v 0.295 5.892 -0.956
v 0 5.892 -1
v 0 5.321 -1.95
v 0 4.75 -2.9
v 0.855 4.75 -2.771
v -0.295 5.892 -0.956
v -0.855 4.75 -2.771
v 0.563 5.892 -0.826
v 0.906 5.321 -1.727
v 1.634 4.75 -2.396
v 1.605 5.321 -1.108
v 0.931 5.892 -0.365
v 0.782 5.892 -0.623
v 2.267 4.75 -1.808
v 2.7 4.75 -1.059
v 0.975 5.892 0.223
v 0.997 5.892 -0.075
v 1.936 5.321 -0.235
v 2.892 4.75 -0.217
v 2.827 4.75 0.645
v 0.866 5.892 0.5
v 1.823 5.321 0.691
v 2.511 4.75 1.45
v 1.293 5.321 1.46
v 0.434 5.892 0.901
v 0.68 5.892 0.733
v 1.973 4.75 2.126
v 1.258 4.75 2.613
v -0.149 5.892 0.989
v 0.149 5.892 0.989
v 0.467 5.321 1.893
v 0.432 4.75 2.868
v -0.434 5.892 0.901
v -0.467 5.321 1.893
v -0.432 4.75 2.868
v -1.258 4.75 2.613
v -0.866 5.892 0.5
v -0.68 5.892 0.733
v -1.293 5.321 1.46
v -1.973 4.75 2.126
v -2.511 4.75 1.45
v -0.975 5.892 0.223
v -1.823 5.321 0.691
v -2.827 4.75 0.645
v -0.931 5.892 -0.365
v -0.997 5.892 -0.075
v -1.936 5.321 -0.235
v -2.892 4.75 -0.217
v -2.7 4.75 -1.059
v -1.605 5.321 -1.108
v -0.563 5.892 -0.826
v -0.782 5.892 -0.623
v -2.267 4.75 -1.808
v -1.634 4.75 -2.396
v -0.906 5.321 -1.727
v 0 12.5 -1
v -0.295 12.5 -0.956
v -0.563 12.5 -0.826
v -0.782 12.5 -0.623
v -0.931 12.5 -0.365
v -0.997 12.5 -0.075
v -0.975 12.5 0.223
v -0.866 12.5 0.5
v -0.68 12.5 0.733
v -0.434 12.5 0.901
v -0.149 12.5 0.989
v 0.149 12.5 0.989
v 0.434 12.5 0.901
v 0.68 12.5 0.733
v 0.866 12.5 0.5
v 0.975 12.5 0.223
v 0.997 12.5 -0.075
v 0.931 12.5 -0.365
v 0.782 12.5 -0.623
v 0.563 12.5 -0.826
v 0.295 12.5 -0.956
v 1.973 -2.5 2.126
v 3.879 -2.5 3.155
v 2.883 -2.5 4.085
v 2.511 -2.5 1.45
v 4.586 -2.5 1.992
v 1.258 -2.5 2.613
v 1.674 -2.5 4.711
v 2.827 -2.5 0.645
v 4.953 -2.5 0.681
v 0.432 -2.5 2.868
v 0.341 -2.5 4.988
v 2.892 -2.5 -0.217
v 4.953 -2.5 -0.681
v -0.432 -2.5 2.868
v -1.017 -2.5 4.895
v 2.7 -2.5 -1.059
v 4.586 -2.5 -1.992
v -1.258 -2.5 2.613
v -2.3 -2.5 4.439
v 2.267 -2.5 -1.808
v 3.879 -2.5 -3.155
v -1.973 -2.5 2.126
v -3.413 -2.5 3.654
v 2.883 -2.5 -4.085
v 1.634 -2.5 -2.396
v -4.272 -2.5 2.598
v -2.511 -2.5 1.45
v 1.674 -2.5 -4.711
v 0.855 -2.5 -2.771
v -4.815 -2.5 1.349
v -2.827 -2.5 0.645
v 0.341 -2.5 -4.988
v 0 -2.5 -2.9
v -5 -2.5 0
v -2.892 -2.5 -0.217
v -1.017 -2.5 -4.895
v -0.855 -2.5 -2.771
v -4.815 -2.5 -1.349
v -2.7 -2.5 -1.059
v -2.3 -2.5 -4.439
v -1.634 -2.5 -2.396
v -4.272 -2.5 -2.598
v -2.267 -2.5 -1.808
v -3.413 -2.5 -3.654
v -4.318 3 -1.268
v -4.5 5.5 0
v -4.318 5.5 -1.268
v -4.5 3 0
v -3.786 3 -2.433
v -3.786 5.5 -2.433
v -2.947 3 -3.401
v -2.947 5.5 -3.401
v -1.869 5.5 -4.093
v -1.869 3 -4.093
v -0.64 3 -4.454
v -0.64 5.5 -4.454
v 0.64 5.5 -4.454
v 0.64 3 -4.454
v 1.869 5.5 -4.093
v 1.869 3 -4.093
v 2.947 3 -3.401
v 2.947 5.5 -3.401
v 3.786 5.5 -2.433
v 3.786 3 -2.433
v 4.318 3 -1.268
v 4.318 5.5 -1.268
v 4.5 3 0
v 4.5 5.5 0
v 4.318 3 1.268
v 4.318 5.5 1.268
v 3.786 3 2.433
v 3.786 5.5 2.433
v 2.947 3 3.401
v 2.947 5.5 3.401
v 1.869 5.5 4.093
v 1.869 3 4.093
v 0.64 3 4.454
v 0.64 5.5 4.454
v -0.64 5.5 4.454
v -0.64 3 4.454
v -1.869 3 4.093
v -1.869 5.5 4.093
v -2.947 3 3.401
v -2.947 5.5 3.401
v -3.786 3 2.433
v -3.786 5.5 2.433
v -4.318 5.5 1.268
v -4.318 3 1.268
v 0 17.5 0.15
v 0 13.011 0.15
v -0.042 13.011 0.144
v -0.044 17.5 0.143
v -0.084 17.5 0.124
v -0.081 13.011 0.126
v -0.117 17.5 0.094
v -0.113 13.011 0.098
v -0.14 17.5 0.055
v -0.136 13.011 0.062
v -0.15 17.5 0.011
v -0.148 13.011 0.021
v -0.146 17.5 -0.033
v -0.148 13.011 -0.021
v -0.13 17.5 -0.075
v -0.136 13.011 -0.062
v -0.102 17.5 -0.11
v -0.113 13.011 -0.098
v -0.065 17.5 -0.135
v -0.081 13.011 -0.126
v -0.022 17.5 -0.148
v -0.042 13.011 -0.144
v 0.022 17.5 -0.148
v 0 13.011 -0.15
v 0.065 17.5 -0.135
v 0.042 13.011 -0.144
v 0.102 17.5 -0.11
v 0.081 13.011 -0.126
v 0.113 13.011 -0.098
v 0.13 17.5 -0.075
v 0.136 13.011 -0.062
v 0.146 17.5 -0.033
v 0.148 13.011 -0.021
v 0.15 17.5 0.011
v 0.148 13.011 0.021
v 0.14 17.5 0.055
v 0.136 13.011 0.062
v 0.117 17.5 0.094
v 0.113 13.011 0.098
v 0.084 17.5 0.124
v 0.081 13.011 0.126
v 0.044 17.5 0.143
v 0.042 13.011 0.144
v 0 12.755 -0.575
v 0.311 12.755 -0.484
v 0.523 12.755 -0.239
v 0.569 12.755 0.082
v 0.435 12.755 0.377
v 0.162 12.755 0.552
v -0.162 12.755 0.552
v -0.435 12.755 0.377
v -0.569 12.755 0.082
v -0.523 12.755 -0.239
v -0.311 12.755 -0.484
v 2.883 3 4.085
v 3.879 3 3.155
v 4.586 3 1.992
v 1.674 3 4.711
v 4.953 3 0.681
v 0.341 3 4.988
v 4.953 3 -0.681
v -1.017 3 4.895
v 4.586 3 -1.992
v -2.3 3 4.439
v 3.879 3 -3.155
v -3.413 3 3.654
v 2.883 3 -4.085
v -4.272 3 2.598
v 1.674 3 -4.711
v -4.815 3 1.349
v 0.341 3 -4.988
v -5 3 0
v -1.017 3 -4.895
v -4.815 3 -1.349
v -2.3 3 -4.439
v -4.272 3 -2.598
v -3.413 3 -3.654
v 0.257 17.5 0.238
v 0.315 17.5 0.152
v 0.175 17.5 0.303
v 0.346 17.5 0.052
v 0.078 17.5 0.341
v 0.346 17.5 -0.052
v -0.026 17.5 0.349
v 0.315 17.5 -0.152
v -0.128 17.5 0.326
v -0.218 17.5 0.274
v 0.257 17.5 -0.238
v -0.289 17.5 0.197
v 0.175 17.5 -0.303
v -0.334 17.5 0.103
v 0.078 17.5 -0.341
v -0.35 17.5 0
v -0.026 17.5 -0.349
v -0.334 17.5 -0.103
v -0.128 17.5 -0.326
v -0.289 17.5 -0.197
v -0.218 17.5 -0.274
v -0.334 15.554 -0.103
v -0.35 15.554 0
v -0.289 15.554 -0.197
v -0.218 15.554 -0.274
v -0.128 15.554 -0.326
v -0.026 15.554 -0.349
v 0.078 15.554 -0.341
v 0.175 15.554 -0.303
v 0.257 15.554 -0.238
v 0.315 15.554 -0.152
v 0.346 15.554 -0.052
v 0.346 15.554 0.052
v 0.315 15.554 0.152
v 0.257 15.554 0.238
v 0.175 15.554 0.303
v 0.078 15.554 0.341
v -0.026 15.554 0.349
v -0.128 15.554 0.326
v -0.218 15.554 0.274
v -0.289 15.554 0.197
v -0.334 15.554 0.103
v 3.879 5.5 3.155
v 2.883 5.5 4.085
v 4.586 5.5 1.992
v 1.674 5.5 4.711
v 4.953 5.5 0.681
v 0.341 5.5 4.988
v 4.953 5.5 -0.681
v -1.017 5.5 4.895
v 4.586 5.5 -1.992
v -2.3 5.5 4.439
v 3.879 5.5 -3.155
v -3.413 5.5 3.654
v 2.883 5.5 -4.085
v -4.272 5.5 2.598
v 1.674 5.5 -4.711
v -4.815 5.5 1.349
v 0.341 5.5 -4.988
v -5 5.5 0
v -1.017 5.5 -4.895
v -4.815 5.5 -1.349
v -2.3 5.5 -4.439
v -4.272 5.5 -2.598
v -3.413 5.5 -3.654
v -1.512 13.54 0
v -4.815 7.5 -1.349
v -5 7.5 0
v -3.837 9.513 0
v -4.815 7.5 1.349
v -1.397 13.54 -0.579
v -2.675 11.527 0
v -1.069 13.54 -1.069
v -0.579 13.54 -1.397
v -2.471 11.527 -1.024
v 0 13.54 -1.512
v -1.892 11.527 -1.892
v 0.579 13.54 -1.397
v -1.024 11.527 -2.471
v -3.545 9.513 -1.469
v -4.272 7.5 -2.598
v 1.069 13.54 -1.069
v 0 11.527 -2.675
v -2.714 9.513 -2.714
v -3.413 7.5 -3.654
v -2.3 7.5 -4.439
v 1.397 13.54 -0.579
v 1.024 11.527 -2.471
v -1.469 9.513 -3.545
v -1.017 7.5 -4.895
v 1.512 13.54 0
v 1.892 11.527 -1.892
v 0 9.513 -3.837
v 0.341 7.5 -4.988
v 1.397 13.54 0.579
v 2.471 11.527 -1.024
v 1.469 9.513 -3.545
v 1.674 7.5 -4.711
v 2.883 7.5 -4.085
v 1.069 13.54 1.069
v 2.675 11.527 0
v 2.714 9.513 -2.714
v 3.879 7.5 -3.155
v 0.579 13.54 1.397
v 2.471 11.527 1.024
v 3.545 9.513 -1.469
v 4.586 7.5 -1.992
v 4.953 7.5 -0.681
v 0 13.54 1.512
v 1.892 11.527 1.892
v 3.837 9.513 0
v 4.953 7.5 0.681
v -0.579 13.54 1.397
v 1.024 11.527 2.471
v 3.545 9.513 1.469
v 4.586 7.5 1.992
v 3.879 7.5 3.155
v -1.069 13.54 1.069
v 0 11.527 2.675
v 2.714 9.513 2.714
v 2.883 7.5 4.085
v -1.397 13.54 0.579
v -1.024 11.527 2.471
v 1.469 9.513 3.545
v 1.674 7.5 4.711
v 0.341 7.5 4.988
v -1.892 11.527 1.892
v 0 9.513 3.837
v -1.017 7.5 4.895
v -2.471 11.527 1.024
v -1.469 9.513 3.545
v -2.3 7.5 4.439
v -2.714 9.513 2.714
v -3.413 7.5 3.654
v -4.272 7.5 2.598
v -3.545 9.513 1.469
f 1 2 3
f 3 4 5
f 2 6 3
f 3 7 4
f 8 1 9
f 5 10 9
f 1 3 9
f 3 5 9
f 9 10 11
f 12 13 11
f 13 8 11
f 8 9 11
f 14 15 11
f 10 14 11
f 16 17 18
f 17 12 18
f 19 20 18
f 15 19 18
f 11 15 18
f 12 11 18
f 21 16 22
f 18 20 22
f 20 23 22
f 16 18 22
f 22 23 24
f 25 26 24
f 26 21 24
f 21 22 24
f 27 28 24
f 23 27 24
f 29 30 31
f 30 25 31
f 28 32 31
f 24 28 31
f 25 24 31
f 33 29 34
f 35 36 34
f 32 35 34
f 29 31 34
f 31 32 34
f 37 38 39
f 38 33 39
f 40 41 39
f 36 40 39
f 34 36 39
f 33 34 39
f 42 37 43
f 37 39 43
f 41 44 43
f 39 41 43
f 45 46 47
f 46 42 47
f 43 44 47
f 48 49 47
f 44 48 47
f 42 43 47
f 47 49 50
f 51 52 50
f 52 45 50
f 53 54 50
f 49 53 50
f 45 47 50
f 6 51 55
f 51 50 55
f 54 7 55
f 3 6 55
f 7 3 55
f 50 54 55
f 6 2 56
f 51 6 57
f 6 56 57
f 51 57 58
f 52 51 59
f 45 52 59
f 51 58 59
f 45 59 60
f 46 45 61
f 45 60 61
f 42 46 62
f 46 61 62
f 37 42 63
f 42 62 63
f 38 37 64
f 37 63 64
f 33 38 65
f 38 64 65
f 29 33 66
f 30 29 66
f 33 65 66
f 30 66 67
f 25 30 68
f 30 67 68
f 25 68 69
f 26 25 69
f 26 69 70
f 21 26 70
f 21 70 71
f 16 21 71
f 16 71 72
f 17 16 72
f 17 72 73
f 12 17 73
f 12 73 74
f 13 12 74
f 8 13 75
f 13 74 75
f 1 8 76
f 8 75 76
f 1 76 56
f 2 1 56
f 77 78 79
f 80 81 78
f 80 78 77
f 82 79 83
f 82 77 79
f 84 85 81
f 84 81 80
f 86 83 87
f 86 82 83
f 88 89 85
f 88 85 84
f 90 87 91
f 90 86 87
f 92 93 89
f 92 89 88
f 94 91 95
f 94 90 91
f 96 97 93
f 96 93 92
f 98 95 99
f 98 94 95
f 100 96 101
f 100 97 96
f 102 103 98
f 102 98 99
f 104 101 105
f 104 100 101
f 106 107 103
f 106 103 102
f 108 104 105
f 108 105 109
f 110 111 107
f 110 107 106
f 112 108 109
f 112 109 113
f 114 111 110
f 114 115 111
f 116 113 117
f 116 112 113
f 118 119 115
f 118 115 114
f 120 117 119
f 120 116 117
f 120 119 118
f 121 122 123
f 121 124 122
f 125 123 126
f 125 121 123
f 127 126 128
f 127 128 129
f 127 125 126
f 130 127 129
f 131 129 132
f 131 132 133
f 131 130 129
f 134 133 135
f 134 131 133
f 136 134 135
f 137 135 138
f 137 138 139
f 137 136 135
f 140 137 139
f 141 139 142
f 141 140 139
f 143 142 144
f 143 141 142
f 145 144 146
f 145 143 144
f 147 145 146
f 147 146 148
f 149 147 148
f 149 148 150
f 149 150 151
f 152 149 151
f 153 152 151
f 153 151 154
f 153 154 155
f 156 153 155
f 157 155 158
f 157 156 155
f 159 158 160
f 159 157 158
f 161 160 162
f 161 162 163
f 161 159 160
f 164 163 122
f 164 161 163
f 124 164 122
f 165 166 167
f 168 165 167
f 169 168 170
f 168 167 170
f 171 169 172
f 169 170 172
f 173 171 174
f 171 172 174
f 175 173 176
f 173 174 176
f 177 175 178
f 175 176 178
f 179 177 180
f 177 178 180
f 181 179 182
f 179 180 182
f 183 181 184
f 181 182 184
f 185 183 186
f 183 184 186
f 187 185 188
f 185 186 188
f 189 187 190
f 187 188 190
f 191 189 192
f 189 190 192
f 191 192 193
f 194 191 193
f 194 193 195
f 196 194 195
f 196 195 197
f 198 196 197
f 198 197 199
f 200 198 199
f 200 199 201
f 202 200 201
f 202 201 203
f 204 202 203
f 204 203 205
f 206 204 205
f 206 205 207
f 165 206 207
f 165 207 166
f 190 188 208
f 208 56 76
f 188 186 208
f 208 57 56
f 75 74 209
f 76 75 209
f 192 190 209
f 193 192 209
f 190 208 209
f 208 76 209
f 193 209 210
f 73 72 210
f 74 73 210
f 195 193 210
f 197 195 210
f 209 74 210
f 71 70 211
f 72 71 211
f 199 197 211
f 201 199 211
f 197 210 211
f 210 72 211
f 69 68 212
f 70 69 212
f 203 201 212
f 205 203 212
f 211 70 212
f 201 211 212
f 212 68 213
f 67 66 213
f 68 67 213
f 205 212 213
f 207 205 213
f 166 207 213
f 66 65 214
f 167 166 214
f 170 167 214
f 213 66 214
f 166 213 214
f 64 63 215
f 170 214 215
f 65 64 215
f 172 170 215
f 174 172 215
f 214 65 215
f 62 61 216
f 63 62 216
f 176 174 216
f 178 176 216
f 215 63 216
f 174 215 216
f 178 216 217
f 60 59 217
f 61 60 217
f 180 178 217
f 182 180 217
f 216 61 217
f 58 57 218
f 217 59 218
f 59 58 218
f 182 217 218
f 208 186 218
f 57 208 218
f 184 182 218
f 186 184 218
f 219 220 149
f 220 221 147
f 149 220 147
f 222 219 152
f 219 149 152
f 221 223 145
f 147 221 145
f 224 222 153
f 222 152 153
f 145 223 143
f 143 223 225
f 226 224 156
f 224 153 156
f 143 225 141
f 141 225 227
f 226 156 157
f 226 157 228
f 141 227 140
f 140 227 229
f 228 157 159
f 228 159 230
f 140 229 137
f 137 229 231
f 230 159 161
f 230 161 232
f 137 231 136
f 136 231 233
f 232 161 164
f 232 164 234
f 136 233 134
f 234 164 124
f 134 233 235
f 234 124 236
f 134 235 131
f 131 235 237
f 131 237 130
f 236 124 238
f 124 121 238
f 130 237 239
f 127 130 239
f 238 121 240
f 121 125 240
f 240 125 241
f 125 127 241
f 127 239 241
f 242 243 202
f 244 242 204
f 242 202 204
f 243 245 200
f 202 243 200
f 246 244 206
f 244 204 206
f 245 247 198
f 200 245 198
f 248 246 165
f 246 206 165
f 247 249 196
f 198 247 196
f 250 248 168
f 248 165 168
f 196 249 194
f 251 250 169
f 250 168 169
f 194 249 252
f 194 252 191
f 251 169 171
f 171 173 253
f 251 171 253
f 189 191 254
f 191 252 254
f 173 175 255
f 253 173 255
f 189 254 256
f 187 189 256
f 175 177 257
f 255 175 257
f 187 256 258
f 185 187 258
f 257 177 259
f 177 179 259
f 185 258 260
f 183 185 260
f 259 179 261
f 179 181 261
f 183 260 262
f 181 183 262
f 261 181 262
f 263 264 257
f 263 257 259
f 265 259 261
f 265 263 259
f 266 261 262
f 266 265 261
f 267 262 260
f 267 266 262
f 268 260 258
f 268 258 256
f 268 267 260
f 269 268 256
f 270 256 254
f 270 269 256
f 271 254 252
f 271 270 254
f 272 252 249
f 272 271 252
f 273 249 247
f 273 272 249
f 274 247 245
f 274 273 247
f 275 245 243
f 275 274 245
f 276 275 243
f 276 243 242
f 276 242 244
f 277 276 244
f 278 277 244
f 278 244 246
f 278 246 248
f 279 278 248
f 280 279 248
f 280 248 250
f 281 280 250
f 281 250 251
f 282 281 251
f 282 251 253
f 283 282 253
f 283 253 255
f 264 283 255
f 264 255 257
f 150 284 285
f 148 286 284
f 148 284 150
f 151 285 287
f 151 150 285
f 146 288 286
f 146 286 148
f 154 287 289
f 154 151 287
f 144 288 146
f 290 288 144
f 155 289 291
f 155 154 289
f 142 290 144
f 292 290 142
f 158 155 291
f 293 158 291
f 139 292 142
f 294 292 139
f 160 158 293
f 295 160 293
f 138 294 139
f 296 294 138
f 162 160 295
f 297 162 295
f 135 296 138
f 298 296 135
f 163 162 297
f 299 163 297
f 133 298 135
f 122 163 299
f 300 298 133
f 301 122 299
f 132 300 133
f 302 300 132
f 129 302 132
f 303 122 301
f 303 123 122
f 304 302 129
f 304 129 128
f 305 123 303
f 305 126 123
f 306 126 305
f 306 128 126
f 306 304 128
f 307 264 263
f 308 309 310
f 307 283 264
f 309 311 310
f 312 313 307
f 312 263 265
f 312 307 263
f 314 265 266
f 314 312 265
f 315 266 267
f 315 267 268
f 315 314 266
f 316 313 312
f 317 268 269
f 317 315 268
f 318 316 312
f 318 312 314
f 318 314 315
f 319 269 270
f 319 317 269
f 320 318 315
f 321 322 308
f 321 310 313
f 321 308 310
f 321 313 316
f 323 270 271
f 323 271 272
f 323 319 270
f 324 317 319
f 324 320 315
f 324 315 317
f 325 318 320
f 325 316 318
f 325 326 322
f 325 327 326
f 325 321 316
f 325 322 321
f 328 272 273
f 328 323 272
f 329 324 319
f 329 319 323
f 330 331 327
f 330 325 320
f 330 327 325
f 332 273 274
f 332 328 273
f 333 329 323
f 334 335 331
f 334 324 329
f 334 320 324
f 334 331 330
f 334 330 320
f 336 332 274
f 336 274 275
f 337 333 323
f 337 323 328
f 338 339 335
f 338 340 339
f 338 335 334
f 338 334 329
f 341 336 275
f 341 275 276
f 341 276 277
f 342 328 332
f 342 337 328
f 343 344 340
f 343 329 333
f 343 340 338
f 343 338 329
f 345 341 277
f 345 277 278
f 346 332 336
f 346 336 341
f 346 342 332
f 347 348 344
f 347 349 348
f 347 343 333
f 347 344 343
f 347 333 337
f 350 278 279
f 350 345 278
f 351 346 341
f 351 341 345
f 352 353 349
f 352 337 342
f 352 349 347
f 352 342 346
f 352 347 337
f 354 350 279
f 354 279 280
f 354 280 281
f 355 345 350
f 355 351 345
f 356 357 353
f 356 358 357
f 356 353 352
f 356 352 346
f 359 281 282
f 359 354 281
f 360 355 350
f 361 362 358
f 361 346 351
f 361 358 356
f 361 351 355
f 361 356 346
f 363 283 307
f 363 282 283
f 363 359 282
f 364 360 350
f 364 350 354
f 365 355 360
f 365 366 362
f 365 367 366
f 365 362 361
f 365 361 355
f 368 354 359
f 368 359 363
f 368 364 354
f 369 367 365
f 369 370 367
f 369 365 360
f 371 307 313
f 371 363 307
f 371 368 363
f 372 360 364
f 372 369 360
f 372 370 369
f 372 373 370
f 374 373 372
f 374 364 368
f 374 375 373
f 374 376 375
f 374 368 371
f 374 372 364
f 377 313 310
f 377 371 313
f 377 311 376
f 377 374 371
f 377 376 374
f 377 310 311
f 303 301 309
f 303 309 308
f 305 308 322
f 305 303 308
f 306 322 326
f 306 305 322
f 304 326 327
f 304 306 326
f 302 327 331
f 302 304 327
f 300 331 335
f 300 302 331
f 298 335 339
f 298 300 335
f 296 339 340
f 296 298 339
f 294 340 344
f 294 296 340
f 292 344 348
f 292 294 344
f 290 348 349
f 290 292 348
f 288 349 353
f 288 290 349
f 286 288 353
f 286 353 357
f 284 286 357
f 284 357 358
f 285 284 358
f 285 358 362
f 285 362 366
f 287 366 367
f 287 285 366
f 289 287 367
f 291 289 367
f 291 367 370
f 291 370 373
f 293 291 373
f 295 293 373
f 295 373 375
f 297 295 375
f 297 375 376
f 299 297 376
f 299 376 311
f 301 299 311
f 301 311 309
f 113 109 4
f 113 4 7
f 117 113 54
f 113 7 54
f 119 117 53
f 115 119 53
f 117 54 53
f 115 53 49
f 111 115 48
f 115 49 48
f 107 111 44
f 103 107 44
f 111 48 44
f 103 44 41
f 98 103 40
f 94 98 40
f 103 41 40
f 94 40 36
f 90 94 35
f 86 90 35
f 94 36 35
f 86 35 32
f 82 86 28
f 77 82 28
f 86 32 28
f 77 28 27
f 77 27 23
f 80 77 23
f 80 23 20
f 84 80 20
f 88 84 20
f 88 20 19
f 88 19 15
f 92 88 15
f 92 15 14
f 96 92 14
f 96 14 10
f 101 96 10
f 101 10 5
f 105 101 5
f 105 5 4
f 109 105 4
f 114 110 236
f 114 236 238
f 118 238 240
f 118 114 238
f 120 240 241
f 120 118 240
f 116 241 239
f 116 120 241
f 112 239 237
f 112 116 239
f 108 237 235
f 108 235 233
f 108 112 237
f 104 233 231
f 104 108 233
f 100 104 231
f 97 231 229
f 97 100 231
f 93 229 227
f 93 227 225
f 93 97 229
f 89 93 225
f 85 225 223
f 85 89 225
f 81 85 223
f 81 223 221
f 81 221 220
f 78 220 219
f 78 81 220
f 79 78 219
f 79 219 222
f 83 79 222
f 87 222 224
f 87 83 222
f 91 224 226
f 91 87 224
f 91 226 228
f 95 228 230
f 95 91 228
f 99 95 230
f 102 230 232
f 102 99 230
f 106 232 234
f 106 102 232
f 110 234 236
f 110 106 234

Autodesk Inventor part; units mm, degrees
ref_plane "YZ Plane" through (0, 0, 0) normal (1, 0, 0) x (0, 1, 0)
ref_plane "XZ Plane" through (0, 0, 0) normal (0, 1, 0) x (-1, 0, 0)
ref_plane "XY Plane" through (0, 0, 0) normal (0, 0, 1) x (1, 0, 0)
sketch "Sketch1" plane through (0, 0, 0) normal (0, 0, 1) x (1, 0, 0)
  line L0 (0, 14.375) -> (0, 5.6)
  line L1 (0, 14.375) -> (0, 17.5)
  line L2 (-0.35, 17.5) -> (-0.35, 15.554)
  line L3 (0, 17.5) -> (0, 5.6)
  line L4 (-0.35, 17.5) -> (0, 17.5)
  line L5 (-5, 7.5) -> (-0.35, 15.554)
  line L6 (-5, 7.5) -> (6.0041, 7.5) construction
  line L7 (-5, -2.5) -> (-2.8, -2.5)
  line L8 (-2.8, -2.5) -> (0, -2.5)
  line L9 (0, -2.5) -> (0, 5.6)
  line L10 (-5, 7.5) -> (-5, 5.5)
  line L11 (-5, 5.5) -> (-4.5, 5.5)
  line L12 (-4.5, 5.5) -> (-4.5, 3)
  line L13 (-4.5, 3) -> (-5, 3)
  line L14 (-5, 7.5) -> (-5, 5.5)
  line L15 (-5, 3) -> (-5, -2.5)
  dimension "d81" = 60
  dimension "d82" = 10
  dimension "d83" = 0.35
  dimension "d84" = 1.946
  dimension "d85" = 8.054
  dimension "d87" = 10
  dimension "d106" = 20
  dimension "d107" = 5
  dimension "d131" = 2
  dimension "d132" = 0.5
  dimension "d133" = 2.5
revolve "Revolution1" add sketch "Sketch1" angle 360 about axis through (0, 14.375, 0) along (0, -1, 0)
ref_plane "Work Plane3" through (0, -2.5, 0) normal (0, 1, 0) x (-1, 0, 0)
sketch "Sketch5" plane through (0, -2.5, 0) normal (0, 1, 0) x (-1, 0, 0)
  point P0 (0, 0)
sketch "Sketch6" plane through (0, -2.5, 0) normal (0, -1, 0) x (1, 0, 0)
  circle A0 centre (0, 0) radius 2.9
  dimension "d108" = 5.8
hole "Hole6" at (0, -2.5, 0) direction (0, 1, 0) diameter 5.8 depth 7.25 tip angle 118
hole "Hole7" at (0, -2.5, 0) direction (0, 1, 0) diameter 2 depth 15 tip angle 118
sketch "Sketch7" plane through (0, 17.5, 0) normal (0, 1, 0) x (1, 0, 0)
  circle A0 centre (0, 0) radius 0.075
  dimension "d123" = 0.15
hole "Hole8" at (0, 17.5, 0) direction (0, -1, 0) diameter 0.3 end through all
properties part number "Nozzle"
